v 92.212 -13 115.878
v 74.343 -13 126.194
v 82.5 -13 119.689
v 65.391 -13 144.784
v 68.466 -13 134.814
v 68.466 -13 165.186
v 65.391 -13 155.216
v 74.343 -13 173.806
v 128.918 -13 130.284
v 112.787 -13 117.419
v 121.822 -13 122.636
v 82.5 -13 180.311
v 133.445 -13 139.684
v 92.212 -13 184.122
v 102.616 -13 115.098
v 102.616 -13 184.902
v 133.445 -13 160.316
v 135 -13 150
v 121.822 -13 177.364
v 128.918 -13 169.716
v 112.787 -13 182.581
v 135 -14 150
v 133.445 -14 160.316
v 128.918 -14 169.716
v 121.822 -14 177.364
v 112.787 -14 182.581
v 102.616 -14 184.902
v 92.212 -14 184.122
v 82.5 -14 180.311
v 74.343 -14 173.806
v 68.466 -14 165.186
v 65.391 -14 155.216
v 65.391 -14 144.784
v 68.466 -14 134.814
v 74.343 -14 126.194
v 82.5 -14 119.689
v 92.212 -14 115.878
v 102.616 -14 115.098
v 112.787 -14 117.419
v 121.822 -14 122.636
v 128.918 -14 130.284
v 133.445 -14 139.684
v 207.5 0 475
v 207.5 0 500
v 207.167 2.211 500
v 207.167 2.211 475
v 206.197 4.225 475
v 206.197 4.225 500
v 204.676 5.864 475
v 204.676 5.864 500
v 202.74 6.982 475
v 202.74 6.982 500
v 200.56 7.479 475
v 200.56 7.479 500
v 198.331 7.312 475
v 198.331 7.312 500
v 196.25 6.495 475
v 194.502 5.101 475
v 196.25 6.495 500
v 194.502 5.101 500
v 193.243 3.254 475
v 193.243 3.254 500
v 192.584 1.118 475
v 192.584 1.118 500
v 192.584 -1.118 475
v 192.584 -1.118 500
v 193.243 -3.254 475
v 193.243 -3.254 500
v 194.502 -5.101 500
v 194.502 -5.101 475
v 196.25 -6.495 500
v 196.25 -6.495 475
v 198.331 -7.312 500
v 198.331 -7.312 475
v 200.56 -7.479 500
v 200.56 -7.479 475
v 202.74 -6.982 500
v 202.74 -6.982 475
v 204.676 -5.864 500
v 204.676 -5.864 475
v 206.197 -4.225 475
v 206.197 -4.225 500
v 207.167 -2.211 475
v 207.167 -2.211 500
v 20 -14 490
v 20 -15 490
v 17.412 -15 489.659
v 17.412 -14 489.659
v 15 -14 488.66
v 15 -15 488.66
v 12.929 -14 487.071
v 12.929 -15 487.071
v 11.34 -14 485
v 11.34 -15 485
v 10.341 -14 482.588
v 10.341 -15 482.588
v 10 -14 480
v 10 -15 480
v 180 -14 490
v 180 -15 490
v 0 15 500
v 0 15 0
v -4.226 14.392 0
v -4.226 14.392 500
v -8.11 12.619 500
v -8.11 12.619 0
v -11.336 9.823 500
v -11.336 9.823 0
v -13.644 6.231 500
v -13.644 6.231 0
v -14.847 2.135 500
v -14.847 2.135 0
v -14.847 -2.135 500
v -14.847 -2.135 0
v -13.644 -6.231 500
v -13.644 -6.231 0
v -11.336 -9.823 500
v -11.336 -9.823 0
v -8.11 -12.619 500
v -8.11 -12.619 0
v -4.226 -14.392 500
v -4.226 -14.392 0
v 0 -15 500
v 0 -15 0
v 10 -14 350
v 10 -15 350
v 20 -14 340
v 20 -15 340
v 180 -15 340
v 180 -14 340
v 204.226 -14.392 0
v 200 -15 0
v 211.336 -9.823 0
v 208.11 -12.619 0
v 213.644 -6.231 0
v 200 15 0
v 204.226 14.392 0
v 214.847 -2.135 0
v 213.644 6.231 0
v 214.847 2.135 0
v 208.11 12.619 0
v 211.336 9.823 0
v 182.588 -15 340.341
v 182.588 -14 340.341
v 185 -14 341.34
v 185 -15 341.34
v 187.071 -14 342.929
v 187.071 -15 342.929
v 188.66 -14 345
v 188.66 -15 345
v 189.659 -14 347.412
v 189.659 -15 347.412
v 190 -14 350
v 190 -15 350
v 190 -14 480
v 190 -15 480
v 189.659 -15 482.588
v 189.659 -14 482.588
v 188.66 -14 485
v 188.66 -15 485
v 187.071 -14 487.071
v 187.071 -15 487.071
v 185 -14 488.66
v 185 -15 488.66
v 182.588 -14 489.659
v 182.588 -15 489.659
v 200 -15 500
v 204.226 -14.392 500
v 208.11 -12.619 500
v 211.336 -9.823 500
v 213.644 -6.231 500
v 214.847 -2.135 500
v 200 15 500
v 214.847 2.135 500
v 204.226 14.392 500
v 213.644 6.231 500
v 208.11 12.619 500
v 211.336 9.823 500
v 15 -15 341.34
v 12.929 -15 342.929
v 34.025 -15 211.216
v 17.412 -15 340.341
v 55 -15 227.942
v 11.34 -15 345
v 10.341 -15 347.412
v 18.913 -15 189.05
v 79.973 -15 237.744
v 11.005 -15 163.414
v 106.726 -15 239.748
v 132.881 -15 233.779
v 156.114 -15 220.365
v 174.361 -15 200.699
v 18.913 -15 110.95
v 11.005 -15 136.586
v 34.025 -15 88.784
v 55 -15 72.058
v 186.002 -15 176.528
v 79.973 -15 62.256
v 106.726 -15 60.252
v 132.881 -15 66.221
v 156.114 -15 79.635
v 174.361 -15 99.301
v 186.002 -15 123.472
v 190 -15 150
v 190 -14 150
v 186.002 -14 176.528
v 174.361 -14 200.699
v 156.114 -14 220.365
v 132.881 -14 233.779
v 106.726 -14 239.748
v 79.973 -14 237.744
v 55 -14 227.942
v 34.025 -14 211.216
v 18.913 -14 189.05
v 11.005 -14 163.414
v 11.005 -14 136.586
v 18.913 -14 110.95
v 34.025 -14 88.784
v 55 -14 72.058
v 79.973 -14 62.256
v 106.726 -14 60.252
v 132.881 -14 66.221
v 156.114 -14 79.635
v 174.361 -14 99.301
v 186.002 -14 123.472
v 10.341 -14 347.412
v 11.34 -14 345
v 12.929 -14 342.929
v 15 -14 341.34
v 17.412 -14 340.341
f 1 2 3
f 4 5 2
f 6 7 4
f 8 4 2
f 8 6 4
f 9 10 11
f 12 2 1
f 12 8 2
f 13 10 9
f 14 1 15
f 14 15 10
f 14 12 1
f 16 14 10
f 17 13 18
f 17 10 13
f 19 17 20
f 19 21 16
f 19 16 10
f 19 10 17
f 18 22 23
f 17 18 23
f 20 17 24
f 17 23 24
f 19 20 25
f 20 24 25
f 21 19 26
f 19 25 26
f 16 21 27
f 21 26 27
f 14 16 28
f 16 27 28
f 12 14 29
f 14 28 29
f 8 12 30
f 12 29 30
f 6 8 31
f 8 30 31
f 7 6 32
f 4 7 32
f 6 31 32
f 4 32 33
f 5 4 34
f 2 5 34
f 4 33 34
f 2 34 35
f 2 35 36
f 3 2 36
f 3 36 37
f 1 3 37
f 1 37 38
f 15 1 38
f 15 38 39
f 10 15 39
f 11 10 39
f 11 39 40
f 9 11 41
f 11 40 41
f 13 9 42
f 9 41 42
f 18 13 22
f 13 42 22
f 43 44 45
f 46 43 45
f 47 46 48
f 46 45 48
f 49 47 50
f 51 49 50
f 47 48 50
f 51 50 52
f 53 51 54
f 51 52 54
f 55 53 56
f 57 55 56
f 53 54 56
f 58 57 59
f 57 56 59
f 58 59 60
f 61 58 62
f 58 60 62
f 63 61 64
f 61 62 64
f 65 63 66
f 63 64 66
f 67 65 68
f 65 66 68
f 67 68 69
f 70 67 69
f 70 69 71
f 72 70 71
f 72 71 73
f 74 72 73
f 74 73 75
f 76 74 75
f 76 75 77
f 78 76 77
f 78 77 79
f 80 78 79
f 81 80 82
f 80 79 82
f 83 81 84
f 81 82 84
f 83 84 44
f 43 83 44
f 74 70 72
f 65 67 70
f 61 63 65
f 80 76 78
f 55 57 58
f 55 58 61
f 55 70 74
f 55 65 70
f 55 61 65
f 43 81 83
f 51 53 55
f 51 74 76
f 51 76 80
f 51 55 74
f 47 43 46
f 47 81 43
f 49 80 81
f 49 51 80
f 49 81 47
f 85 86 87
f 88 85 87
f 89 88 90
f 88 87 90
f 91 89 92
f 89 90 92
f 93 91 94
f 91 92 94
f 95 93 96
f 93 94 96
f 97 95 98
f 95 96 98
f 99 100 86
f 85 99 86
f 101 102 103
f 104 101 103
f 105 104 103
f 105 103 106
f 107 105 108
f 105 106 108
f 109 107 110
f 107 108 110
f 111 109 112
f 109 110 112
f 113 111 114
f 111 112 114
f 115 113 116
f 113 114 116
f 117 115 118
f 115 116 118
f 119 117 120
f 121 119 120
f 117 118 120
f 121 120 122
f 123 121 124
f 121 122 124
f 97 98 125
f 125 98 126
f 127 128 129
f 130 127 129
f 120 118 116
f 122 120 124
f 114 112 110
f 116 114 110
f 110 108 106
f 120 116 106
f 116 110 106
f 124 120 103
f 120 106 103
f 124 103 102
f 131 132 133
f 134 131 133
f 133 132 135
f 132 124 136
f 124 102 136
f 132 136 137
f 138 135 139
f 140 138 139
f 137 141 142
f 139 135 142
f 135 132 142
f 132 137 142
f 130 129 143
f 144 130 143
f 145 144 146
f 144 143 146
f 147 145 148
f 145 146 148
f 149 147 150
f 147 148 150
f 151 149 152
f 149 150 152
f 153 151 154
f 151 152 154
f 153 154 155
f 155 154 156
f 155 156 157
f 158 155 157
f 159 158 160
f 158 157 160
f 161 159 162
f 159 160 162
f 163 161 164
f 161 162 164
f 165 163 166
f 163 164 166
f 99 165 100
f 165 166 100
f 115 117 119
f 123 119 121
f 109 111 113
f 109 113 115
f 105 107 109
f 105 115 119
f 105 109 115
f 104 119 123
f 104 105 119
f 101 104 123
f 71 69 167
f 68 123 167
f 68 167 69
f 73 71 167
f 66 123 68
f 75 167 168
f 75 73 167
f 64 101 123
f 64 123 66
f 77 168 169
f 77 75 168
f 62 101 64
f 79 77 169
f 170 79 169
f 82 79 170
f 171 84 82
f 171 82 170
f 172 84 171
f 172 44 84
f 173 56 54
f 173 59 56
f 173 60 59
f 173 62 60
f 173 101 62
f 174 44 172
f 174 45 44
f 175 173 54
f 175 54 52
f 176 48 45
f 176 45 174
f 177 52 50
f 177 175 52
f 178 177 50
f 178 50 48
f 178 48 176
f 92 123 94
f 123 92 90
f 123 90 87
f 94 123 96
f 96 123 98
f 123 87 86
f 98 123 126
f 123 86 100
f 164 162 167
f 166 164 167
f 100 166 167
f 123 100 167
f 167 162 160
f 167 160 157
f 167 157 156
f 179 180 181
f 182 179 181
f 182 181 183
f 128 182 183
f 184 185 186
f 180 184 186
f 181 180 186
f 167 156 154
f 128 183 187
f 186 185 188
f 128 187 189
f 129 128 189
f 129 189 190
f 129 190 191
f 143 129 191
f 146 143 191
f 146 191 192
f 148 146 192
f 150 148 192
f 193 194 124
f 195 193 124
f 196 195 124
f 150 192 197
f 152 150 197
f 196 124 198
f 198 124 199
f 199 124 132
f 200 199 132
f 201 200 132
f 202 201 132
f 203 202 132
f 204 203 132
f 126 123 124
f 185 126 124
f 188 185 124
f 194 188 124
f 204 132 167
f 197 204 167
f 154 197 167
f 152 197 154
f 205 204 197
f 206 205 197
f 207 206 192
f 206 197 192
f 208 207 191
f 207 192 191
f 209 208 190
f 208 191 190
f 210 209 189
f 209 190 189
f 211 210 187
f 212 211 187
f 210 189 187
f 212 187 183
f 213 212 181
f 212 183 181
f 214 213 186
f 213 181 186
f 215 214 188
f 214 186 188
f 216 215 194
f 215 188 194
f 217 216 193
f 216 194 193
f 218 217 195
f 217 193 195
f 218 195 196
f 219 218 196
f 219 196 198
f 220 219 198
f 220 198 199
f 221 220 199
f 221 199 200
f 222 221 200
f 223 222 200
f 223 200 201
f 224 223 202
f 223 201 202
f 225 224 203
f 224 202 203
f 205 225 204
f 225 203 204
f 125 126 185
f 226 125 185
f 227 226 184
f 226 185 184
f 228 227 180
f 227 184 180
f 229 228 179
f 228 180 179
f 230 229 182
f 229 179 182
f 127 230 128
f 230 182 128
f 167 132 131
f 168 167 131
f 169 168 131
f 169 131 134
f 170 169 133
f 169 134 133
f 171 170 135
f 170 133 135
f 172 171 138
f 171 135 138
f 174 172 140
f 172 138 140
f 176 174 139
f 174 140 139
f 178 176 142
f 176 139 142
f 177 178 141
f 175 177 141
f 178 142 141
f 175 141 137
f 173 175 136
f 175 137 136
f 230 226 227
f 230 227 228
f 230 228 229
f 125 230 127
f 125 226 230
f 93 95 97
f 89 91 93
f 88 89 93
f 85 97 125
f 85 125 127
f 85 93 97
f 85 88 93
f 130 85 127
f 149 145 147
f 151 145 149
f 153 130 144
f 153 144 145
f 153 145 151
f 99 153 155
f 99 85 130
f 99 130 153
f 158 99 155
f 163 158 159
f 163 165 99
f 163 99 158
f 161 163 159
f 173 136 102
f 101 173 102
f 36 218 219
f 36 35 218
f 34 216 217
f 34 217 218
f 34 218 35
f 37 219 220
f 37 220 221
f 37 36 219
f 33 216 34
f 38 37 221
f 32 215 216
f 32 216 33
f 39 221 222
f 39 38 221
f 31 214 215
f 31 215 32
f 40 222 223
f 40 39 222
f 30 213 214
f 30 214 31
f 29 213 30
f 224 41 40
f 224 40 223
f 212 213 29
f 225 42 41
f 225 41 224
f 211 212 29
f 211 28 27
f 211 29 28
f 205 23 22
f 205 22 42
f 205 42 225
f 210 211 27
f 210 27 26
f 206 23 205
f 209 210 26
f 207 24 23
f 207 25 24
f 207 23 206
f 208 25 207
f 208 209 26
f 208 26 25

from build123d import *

# Parameters (mm, degrees)
F1_DEPTH = 500
F3_DEPTH = 1
F4_R     = 90
F5_DEPTH = 1
F6_R     = 35
F7_DEPTH = 1
F8_R     = 7.5
F9_DEPTH = 25


with BuildPart() as f1:
    # F0 (on Top) → F1 (new body)
    with BuildSketch(Plane.XY):
        with BuildLine():
            Line((200, 15), (0, 15))
            ThreePointArc((0, 15), (-15, 0), (0, -15))
            Line((0, -15), (200, -15))
            ThreePointArc((200, -15), (215, 0), (200, 15))
        make_face()
    extrude(amount=F1_DEPTH)

    # F2 (on face) → F3 (cut)
    with BuildSketch(Plane.XZ.offset(15)):
        with BuildLine():
            Line((180, 490), (20, 490))
            ThreePointArc((20, 490), (12.928932, 487.071068), (10, 480))
            Line((10, 480), (10, 350))
            ThreePointArc((10, 350), (12.928932, 342.928932), (20, 340))
            Line((20, 340), (180, 340))
            ThreePointArc((180, 340), (187.071068, 342.928932), (190, 350))
            Line((190, 350), (190, 480))
            ThreePointArc((190, 480), (187.071068, 487.071068), (180, 490))
        make_face()
    extrude(amount=-F3_DEPTH, mode=Mode.SUBTRACT)

    # F4 (on face) → F5 (cut)
    with BuildSketch(Plane.XZ.offset(15)):
        with Locations((100, 150)):
            Circle(F4_R)
    extrude(amount=-F5_DEPTH, mode=Mode.SUBTRACT)

    # F6 (on face) → F7 (cut)
    with BuildSketch(Plane.XZ.offset(14)):
        with Locations((100, 150)):
            Circle(F6_R)
    extrude(amount=-F7_DEPTH, mode=Mode.SUBTRACT)

    # F8 (on face) → F9 (cut)
    with BuildSketch(Plane.XY.offset(500)):
        with Locations((200, 0)):
            Circle(F8_R)
    extrude(amount=-F9_DEPTH, mode=Mode.SUBTRACT)


solid = f1.part
